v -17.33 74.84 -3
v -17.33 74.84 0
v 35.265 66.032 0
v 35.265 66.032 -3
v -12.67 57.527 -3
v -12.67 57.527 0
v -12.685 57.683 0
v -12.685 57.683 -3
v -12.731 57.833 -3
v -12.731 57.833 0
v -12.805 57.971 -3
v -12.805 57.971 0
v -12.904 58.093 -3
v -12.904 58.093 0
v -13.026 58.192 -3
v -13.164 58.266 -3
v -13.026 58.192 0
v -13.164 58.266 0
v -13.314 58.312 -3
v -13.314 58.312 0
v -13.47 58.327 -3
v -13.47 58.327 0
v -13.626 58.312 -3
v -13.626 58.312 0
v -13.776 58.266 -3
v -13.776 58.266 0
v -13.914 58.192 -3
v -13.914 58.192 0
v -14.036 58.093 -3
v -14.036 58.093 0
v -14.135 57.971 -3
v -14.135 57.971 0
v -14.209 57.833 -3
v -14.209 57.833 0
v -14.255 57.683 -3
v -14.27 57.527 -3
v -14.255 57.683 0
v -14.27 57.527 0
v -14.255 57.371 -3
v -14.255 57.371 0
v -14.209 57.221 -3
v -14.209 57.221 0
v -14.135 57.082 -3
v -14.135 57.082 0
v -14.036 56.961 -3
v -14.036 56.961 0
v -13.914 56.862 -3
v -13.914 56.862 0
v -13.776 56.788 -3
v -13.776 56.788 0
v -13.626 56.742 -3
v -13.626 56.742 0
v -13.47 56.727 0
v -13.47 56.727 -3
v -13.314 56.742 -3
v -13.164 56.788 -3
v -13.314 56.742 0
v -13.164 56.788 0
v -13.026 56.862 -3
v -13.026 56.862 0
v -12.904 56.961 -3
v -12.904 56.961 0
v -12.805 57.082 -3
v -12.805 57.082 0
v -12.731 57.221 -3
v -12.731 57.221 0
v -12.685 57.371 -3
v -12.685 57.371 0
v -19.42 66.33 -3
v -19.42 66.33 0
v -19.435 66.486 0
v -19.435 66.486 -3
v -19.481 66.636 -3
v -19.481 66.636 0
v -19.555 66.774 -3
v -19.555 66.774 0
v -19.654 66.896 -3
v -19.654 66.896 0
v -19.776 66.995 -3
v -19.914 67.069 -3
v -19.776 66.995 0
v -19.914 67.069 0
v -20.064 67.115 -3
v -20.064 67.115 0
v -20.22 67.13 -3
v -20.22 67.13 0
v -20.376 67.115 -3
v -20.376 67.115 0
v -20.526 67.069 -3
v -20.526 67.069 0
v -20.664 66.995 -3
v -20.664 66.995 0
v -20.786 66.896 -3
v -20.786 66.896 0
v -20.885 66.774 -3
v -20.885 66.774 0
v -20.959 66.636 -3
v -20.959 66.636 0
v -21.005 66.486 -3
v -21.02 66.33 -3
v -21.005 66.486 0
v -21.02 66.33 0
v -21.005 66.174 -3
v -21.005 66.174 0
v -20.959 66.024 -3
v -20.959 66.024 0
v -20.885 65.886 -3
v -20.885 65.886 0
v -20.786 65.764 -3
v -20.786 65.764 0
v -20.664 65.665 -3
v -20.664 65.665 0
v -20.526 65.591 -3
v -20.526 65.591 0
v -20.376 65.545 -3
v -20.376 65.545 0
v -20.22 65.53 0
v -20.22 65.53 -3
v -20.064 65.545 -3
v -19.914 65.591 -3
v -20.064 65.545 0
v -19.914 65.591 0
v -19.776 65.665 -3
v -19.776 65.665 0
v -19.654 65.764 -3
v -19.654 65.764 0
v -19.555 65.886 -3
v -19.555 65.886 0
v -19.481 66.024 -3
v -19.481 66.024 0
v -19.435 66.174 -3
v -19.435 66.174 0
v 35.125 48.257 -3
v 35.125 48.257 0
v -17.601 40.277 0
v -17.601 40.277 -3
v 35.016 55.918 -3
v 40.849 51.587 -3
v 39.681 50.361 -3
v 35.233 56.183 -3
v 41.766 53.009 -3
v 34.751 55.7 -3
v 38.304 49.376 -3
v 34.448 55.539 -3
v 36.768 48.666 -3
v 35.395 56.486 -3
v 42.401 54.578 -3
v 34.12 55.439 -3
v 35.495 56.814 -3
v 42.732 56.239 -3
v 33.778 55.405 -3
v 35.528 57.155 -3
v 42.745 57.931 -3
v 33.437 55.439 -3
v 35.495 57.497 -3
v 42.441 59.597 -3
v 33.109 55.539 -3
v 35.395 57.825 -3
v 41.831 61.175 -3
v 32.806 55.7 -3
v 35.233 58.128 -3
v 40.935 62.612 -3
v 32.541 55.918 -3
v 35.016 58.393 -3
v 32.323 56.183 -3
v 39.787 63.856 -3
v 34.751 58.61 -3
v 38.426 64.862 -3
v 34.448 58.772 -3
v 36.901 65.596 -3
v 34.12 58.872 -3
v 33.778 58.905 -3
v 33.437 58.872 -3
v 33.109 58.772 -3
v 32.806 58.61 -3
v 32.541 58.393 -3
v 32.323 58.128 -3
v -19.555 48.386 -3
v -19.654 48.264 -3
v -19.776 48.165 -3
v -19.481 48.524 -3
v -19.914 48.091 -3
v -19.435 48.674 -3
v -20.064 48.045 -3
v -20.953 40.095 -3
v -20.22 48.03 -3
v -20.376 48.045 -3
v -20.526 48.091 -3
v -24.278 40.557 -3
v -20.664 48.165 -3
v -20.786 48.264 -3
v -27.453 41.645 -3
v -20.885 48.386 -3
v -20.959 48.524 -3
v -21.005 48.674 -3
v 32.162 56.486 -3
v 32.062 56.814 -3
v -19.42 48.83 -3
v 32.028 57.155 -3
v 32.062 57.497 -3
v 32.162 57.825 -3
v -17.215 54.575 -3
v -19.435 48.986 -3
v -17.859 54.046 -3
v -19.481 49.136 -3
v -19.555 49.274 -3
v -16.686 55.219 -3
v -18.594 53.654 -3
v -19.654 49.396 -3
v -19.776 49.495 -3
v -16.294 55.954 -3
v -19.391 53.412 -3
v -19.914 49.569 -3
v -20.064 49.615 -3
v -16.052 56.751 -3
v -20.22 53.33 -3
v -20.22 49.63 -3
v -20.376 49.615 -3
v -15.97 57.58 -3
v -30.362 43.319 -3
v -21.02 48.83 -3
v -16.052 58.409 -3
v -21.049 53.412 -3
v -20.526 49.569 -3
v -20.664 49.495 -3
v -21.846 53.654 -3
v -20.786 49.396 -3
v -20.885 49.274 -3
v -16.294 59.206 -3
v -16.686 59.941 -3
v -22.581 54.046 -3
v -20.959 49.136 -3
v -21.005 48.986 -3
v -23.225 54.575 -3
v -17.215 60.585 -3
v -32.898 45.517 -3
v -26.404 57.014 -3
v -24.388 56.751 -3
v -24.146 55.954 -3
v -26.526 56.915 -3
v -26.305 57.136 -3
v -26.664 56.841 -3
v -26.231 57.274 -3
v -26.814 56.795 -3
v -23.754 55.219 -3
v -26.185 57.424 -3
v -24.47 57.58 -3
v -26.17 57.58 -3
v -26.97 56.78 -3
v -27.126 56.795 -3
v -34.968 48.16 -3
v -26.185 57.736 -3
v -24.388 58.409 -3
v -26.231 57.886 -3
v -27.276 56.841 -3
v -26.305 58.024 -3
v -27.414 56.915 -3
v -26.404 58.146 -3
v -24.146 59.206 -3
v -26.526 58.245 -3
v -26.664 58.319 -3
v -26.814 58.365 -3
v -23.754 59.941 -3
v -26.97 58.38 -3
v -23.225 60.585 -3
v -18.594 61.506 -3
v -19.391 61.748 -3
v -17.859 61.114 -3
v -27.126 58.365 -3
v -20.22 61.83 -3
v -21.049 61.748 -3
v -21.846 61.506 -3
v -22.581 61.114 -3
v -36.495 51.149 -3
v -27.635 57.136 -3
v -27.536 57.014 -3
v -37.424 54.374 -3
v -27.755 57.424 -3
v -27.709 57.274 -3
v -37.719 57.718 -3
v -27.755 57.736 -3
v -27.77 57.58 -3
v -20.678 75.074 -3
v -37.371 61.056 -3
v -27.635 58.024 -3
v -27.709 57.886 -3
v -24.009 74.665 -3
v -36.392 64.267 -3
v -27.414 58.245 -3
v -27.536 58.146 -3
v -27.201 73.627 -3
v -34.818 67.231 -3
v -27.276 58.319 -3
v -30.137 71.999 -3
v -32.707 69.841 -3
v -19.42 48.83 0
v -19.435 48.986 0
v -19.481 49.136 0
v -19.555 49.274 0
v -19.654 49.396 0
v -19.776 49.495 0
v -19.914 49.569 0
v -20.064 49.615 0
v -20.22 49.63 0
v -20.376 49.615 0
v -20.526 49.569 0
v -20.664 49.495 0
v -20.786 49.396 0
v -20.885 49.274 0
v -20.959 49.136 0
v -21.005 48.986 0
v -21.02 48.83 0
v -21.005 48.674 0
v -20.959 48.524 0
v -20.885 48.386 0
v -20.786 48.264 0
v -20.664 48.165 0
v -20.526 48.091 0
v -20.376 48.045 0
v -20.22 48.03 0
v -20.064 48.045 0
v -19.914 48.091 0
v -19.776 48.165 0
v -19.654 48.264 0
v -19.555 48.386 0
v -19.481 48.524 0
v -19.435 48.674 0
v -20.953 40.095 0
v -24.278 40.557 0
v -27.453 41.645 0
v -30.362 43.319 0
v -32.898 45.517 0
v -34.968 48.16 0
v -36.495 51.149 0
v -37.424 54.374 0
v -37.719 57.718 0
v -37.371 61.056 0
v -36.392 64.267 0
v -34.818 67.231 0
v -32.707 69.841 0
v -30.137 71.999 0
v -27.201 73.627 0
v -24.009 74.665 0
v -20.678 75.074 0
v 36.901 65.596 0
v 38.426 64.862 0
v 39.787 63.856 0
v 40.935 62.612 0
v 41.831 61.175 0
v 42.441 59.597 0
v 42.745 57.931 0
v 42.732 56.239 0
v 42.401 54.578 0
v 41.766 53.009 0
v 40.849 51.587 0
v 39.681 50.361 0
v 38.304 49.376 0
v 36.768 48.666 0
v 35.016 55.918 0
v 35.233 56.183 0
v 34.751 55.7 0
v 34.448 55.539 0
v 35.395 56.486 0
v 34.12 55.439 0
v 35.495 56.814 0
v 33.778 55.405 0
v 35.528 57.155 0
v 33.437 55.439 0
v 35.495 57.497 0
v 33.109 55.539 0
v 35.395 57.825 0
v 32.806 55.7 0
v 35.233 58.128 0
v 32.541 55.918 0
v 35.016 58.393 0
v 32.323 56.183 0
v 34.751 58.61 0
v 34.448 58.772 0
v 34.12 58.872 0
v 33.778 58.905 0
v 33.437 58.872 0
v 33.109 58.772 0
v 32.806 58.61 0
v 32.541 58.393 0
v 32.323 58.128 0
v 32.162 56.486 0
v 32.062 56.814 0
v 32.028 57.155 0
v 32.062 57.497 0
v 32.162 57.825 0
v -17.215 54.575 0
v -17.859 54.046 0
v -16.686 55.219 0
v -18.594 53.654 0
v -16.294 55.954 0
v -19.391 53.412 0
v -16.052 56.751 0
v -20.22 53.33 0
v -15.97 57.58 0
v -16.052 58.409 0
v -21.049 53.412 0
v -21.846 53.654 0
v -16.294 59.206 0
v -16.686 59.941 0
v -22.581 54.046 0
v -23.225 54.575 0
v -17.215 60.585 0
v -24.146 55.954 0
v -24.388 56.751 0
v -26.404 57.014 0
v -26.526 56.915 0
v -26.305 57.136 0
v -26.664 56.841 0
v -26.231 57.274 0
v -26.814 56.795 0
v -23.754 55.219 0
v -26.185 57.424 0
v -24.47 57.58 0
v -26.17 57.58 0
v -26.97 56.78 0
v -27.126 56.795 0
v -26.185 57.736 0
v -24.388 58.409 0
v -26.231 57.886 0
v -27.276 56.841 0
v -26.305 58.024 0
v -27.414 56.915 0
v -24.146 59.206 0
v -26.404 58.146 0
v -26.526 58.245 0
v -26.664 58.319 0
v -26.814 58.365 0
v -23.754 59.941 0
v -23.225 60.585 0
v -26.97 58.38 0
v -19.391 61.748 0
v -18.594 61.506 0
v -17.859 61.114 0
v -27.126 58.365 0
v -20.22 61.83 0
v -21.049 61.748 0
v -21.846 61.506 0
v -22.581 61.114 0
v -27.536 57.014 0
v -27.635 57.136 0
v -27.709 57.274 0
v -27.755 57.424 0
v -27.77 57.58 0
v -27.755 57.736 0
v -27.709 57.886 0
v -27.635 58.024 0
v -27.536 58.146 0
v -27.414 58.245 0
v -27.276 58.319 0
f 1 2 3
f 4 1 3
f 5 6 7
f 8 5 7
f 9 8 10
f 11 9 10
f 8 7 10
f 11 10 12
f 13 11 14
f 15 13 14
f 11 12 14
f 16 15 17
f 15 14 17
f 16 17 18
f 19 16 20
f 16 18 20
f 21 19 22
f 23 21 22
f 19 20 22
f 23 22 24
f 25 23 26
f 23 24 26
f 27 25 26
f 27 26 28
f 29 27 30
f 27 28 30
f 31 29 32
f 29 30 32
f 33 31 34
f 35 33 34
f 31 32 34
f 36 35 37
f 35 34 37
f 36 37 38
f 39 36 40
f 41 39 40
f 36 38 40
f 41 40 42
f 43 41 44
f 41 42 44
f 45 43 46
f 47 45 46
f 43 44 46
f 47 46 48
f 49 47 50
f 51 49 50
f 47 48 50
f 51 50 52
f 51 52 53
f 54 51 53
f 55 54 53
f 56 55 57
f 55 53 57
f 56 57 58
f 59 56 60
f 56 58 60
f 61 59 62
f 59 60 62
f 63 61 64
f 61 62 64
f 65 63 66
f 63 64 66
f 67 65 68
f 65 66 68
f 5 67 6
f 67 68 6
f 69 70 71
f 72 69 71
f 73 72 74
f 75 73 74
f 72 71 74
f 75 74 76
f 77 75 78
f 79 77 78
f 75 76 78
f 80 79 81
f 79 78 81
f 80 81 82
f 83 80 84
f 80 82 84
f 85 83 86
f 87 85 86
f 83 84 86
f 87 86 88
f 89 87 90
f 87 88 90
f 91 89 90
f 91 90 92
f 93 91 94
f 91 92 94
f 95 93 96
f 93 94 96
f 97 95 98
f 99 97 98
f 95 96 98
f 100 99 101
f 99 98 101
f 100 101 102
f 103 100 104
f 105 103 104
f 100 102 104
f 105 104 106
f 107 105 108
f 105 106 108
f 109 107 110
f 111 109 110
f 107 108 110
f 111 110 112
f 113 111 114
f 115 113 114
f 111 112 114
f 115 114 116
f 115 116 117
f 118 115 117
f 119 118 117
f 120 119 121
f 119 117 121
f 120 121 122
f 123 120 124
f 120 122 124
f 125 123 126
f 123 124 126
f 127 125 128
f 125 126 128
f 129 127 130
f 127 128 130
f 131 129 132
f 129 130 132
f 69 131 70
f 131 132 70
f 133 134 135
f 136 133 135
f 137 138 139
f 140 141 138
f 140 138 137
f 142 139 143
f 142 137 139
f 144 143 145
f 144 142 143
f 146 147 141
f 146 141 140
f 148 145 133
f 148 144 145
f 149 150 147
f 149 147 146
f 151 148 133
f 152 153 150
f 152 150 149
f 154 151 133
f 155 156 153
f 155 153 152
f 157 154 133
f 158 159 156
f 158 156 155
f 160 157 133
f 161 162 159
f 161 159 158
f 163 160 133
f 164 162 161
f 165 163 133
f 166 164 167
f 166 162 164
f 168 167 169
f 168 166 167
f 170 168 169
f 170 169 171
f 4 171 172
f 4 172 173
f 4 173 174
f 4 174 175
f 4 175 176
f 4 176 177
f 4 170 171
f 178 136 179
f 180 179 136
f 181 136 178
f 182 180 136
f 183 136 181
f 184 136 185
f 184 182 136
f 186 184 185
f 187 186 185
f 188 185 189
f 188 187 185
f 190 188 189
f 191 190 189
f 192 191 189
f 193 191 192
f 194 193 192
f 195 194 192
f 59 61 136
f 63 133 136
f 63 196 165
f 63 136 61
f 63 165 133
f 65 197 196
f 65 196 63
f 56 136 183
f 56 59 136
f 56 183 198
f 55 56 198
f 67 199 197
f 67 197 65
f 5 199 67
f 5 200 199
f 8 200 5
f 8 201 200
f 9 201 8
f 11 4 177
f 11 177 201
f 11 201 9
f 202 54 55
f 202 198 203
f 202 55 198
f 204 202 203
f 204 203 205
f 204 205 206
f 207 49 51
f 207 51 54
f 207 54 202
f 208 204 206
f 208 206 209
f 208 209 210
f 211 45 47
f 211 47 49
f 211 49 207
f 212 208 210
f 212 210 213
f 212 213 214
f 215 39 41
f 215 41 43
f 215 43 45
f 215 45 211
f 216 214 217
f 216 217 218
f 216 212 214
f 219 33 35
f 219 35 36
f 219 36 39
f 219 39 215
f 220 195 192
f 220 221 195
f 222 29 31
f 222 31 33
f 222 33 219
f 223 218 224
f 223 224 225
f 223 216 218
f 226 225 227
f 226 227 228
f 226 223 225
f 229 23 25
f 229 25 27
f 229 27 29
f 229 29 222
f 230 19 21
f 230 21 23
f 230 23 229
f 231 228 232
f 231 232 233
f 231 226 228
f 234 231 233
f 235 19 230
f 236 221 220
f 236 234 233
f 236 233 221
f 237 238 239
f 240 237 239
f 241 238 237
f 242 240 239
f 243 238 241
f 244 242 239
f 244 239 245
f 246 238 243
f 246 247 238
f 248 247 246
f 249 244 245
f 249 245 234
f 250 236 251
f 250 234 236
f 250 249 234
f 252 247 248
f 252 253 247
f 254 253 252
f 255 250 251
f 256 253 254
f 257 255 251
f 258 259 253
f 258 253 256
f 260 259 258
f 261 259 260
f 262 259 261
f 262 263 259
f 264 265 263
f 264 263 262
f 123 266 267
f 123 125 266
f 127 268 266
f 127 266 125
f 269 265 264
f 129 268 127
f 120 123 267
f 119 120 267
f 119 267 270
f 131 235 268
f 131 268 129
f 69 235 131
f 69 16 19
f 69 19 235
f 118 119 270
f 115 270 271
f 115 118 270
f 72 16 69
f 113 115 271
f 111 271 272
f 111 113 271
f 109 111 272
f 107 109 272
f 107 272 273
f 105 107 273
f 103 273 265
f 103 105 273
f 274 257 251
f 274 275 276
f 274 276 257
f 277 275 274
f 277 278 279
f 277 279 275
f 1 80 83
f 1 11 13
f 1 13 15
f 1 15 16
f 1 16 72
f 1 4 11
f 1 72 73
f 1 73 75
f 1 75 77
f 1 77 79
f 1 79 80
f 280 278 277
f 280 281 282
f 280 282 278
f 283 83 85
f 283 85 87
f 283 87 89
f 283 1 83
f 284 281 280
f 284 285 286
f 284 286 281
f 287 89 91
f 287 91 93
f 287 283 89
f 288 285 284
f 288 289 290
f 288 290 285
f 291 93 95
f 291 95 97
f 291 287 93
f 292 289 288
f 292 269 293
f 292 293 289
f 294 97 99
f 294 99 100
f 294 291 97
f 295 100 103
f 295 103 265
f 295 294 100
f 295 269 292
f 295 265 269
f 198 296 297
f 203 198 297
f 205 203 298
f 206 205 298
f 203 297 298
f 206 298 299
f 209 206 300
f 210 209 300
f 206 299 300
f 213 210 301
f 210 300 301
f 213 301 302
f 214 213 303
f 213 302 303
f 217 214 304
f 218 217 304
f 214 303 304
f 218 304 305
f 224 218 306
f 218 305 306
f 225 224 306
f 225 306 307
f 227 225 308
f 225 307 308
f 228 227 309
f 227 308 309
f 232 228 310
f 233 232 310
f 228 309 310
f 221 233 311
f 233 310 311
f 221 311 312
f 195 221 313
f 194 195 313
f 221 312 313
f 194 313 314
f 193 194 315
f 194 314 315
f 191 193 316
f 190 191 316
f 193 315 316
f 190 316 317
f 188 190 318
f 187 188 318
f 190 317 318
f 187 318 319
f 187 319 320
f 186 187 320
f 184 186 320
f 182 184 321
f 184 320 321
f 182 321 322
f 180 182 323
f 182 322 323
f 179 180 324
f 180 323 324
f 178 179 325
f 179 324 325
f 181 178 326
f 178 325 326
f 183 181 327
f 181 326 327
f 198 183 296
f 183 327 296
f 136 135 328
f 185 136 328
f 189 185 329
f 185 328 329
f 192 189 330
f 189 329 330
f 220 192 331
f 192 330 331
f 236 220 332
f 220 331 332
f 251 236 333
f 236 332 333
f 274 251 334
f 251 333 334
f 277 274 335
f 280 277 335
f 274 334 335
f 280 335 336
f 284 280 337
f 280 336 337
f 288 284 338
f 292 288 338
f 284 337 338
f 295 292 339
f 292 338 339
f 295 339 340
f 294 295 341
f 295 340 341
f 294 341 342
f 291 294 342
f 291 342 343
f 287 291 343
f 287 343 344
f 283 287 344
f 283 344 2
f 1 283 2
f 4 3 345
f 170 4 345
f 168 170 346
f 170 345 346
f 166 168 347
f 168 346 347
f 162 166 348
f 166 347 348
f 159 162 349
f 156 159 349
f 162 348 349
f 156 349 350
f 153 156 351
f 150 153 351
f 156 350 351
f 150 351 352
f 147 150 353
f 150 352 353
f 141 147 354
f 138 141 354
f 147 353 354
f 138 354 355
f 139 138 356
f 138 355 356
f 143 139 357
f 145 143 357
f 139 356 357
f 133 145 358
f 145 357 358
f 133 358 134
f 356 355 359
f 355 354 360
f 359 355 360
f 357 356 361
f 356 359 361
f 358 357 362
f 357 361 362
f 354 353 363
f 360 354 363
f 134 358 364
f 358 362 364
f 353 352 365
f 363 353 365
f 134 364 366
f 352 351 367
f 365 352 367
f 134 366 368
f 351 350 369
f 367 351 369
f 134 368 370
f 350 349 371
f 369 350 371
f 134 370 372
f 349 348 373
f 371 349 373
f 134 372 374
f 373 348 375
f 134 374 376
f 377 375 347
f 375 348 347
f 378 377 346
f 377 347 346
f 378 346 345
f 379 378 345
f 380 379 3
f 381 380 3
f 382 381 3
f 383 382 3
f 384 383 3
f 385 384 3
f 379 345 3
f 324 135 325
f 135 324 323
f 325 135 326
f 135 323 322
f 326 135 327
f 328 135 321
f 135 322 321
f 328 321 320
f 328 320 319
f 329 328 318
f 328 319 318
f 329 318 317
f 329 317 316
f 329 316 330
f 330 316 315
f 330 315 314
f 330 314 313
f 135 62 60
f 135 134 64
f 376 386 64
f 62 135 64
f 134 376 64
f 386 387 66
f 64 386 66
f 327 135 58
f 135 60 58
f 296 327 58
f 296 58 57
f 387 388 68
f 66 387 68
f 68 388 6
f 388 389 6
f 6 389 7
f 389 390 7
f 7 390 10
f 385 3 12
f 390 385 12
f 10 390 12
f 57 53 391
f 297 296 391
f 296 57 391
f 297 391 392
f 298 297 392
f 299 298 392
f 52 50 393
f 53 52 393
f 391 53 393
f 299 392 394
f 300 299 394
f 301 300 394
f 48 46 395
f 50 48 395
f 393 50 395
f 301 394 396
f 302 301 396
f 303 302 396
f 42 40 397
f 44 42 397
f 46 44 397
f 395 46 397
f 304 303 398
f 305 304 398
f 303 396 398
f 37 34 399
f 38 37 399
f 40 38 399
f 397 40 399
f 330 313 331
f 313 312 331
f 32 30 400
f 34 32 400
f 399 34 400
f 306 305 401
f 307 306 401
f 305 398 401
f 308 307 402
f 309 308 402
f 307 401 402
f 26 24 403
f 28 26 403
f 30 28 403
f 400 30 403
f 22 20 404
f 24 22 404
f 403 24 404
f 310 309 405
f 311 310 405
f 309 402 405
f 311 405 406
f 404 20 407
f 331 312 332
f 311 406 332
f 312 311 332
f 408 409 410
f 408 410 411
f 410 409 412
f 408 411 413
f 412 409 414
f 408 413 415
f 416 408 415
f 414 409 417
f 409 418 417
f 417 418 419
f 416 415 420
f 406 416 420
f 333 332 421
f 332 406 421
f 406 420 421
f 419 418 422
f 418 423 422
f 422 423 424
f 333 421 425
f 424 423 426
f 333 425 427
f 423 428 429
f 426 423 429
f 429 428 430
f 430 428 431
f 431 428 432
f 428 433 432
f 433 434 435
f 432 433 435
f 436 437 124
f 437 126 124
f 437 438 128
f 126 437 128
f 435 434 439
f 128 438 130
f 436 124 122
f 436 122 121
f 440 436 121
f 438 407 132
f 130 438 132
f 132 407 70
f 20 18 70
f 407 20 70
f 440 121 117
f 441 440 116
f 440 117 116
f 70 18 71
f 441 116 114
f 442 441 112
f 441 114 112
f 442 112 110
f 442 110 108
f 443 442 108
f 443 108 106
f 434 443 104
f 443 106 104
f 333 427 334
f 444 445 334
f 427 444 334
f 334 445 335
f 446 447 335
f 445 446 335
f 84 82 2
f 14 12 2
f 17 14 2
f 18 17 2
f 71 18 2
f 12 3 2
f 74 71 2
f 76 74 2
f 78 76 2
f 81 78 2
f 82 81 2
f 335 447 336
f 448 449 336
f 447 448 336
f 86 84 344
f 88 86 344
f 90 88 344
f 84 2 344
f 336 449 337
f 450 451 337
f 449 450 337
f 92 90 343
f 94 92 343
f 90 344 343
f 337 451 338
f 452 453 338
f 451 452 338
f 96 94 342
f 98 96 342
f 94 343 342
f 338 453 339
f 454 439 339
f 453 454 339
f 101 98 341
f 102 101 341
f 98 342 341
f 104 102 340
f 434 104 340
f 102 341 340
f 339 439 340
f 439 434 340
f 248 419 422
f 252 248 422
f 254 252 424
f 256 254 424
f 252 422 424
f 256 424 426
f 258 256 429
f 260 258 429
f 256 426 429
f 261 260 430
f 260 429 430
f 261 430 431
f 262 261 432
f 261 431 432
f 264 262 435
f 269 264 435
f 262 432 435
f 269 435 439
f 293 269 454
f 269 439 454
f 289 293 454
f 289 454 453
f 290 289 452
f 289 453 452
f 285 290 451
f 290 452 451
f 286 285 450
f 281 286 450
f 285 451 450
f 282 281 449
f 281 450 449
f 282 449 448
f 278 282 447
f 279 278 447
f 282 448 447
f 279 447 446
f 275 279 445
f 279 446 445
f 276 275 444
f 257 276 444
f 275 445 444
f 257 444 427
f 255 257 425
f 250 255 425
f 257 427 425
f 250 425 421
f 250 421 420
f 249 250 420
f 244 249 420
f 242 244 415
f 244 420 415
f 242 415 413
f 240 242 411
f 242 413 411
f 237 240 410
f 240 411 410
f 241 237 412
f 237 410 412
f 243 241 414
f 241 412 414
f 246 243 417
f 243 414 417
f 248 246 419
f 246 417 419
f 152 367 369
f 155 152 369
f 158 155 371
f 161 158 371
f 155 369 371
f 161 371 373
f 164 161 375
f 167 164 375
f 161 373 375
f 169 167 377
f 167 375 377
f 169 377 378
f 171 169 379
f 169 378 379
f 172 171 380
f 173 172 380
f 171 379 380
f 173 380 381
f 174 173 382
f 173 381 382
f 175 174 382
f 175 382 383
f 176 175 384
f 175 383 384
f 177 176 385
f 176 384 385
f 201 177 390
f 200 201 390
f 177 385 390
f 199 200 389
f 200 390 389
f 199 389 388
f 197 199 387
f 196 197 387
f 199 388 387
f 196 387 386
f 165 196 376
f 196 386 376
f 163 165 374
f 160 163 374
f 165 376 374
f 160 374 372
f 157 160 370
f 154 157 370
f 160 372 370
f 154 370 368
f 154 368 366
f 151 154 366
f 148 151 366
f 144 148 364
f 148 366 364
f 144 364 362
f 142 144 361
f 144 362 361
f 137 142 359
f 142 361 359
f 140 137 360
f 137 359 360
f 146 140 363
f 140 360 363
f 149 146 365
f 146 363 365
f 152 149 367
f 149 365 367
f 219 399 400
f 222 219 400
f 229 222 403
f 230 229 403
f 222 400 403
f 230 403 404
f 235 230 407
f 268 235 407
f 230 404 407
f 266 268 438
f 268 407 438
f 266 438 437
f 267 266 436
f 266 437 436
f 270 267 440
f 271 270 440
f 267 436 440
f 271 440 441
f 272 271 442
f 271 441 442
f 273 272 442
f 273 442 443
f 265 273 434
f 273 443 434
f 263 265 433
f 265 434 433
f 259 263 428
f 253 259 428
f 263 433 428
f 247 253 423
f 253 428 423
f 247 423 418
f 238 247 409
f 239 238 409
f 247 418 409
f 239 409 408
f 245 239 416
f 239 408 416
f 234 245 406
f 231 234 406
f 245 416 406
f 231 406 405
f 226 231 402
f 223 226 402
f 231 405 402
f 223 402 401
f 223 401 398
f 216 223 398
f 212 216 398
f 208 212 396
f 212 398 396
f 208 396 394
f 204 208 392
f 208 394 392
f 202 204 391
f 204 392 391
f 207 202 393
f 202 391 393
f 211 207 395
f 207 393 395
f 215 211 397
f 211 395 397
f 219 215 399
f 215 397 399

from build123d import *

# Parameters (mm, degrees)
SKETCH1_R           = 1.75
SKETCH1_R_2         = 4.25
SKETCH1_R_3         = 0.8
BOSS_EXTRUDE2_DEPTH = 3


with BuildPart() as part:
    # Sketch1 → Boss-Extrude2 (new body)
    with BuildSketch(Plane.XY):
        with BuildLine():
            Line((-17.329564893, 74.83964614), (35.264840048, 66.03177643))
            ThreePointArc((35.264840048, 66.03177643), (42.778052326, 57.084618151), (35.125066821, 48.256718465))
            Line((35.125066821, 48.256718465), (-17.601346169, 40.27703343))
            ThreePointArc((-17.601346169, 40.27703343), (-37.719458979, 57.717606069), (-17.329564893, 74.83964614))
        make_face()
        with Locations((33.778330565, 57.155386987)):
            Circle(SKETCH1_R, mode=Mode.SUBTRACT)
        with Locations((-20.22, 57.58)):
            Circle(SKETCH1_R_2, mode=Mode.SUBTRACT)
        with Locations((-13.47, 57.526921732)):
            Circle(SKETCH1_R_3, mode=Mode.SUBTRACT)
        with Locations((-26.97, 57.58)):
            Circle(SKETCH1_R_3, mode=Mode.SUBTRACT)
        with Locations((-20.22, 66.33)):
            Circle(SKETCH1_R_3, mode=Mode.SUBTRACT)
        with Locations((-20.22, 48.83)):
            Circle(SKETCH1_R_3, mode=Mode.SUBTRACT)
    extrude(amount=-BOSS_EXTRUDE2_DEPTH)


solid = part.part
